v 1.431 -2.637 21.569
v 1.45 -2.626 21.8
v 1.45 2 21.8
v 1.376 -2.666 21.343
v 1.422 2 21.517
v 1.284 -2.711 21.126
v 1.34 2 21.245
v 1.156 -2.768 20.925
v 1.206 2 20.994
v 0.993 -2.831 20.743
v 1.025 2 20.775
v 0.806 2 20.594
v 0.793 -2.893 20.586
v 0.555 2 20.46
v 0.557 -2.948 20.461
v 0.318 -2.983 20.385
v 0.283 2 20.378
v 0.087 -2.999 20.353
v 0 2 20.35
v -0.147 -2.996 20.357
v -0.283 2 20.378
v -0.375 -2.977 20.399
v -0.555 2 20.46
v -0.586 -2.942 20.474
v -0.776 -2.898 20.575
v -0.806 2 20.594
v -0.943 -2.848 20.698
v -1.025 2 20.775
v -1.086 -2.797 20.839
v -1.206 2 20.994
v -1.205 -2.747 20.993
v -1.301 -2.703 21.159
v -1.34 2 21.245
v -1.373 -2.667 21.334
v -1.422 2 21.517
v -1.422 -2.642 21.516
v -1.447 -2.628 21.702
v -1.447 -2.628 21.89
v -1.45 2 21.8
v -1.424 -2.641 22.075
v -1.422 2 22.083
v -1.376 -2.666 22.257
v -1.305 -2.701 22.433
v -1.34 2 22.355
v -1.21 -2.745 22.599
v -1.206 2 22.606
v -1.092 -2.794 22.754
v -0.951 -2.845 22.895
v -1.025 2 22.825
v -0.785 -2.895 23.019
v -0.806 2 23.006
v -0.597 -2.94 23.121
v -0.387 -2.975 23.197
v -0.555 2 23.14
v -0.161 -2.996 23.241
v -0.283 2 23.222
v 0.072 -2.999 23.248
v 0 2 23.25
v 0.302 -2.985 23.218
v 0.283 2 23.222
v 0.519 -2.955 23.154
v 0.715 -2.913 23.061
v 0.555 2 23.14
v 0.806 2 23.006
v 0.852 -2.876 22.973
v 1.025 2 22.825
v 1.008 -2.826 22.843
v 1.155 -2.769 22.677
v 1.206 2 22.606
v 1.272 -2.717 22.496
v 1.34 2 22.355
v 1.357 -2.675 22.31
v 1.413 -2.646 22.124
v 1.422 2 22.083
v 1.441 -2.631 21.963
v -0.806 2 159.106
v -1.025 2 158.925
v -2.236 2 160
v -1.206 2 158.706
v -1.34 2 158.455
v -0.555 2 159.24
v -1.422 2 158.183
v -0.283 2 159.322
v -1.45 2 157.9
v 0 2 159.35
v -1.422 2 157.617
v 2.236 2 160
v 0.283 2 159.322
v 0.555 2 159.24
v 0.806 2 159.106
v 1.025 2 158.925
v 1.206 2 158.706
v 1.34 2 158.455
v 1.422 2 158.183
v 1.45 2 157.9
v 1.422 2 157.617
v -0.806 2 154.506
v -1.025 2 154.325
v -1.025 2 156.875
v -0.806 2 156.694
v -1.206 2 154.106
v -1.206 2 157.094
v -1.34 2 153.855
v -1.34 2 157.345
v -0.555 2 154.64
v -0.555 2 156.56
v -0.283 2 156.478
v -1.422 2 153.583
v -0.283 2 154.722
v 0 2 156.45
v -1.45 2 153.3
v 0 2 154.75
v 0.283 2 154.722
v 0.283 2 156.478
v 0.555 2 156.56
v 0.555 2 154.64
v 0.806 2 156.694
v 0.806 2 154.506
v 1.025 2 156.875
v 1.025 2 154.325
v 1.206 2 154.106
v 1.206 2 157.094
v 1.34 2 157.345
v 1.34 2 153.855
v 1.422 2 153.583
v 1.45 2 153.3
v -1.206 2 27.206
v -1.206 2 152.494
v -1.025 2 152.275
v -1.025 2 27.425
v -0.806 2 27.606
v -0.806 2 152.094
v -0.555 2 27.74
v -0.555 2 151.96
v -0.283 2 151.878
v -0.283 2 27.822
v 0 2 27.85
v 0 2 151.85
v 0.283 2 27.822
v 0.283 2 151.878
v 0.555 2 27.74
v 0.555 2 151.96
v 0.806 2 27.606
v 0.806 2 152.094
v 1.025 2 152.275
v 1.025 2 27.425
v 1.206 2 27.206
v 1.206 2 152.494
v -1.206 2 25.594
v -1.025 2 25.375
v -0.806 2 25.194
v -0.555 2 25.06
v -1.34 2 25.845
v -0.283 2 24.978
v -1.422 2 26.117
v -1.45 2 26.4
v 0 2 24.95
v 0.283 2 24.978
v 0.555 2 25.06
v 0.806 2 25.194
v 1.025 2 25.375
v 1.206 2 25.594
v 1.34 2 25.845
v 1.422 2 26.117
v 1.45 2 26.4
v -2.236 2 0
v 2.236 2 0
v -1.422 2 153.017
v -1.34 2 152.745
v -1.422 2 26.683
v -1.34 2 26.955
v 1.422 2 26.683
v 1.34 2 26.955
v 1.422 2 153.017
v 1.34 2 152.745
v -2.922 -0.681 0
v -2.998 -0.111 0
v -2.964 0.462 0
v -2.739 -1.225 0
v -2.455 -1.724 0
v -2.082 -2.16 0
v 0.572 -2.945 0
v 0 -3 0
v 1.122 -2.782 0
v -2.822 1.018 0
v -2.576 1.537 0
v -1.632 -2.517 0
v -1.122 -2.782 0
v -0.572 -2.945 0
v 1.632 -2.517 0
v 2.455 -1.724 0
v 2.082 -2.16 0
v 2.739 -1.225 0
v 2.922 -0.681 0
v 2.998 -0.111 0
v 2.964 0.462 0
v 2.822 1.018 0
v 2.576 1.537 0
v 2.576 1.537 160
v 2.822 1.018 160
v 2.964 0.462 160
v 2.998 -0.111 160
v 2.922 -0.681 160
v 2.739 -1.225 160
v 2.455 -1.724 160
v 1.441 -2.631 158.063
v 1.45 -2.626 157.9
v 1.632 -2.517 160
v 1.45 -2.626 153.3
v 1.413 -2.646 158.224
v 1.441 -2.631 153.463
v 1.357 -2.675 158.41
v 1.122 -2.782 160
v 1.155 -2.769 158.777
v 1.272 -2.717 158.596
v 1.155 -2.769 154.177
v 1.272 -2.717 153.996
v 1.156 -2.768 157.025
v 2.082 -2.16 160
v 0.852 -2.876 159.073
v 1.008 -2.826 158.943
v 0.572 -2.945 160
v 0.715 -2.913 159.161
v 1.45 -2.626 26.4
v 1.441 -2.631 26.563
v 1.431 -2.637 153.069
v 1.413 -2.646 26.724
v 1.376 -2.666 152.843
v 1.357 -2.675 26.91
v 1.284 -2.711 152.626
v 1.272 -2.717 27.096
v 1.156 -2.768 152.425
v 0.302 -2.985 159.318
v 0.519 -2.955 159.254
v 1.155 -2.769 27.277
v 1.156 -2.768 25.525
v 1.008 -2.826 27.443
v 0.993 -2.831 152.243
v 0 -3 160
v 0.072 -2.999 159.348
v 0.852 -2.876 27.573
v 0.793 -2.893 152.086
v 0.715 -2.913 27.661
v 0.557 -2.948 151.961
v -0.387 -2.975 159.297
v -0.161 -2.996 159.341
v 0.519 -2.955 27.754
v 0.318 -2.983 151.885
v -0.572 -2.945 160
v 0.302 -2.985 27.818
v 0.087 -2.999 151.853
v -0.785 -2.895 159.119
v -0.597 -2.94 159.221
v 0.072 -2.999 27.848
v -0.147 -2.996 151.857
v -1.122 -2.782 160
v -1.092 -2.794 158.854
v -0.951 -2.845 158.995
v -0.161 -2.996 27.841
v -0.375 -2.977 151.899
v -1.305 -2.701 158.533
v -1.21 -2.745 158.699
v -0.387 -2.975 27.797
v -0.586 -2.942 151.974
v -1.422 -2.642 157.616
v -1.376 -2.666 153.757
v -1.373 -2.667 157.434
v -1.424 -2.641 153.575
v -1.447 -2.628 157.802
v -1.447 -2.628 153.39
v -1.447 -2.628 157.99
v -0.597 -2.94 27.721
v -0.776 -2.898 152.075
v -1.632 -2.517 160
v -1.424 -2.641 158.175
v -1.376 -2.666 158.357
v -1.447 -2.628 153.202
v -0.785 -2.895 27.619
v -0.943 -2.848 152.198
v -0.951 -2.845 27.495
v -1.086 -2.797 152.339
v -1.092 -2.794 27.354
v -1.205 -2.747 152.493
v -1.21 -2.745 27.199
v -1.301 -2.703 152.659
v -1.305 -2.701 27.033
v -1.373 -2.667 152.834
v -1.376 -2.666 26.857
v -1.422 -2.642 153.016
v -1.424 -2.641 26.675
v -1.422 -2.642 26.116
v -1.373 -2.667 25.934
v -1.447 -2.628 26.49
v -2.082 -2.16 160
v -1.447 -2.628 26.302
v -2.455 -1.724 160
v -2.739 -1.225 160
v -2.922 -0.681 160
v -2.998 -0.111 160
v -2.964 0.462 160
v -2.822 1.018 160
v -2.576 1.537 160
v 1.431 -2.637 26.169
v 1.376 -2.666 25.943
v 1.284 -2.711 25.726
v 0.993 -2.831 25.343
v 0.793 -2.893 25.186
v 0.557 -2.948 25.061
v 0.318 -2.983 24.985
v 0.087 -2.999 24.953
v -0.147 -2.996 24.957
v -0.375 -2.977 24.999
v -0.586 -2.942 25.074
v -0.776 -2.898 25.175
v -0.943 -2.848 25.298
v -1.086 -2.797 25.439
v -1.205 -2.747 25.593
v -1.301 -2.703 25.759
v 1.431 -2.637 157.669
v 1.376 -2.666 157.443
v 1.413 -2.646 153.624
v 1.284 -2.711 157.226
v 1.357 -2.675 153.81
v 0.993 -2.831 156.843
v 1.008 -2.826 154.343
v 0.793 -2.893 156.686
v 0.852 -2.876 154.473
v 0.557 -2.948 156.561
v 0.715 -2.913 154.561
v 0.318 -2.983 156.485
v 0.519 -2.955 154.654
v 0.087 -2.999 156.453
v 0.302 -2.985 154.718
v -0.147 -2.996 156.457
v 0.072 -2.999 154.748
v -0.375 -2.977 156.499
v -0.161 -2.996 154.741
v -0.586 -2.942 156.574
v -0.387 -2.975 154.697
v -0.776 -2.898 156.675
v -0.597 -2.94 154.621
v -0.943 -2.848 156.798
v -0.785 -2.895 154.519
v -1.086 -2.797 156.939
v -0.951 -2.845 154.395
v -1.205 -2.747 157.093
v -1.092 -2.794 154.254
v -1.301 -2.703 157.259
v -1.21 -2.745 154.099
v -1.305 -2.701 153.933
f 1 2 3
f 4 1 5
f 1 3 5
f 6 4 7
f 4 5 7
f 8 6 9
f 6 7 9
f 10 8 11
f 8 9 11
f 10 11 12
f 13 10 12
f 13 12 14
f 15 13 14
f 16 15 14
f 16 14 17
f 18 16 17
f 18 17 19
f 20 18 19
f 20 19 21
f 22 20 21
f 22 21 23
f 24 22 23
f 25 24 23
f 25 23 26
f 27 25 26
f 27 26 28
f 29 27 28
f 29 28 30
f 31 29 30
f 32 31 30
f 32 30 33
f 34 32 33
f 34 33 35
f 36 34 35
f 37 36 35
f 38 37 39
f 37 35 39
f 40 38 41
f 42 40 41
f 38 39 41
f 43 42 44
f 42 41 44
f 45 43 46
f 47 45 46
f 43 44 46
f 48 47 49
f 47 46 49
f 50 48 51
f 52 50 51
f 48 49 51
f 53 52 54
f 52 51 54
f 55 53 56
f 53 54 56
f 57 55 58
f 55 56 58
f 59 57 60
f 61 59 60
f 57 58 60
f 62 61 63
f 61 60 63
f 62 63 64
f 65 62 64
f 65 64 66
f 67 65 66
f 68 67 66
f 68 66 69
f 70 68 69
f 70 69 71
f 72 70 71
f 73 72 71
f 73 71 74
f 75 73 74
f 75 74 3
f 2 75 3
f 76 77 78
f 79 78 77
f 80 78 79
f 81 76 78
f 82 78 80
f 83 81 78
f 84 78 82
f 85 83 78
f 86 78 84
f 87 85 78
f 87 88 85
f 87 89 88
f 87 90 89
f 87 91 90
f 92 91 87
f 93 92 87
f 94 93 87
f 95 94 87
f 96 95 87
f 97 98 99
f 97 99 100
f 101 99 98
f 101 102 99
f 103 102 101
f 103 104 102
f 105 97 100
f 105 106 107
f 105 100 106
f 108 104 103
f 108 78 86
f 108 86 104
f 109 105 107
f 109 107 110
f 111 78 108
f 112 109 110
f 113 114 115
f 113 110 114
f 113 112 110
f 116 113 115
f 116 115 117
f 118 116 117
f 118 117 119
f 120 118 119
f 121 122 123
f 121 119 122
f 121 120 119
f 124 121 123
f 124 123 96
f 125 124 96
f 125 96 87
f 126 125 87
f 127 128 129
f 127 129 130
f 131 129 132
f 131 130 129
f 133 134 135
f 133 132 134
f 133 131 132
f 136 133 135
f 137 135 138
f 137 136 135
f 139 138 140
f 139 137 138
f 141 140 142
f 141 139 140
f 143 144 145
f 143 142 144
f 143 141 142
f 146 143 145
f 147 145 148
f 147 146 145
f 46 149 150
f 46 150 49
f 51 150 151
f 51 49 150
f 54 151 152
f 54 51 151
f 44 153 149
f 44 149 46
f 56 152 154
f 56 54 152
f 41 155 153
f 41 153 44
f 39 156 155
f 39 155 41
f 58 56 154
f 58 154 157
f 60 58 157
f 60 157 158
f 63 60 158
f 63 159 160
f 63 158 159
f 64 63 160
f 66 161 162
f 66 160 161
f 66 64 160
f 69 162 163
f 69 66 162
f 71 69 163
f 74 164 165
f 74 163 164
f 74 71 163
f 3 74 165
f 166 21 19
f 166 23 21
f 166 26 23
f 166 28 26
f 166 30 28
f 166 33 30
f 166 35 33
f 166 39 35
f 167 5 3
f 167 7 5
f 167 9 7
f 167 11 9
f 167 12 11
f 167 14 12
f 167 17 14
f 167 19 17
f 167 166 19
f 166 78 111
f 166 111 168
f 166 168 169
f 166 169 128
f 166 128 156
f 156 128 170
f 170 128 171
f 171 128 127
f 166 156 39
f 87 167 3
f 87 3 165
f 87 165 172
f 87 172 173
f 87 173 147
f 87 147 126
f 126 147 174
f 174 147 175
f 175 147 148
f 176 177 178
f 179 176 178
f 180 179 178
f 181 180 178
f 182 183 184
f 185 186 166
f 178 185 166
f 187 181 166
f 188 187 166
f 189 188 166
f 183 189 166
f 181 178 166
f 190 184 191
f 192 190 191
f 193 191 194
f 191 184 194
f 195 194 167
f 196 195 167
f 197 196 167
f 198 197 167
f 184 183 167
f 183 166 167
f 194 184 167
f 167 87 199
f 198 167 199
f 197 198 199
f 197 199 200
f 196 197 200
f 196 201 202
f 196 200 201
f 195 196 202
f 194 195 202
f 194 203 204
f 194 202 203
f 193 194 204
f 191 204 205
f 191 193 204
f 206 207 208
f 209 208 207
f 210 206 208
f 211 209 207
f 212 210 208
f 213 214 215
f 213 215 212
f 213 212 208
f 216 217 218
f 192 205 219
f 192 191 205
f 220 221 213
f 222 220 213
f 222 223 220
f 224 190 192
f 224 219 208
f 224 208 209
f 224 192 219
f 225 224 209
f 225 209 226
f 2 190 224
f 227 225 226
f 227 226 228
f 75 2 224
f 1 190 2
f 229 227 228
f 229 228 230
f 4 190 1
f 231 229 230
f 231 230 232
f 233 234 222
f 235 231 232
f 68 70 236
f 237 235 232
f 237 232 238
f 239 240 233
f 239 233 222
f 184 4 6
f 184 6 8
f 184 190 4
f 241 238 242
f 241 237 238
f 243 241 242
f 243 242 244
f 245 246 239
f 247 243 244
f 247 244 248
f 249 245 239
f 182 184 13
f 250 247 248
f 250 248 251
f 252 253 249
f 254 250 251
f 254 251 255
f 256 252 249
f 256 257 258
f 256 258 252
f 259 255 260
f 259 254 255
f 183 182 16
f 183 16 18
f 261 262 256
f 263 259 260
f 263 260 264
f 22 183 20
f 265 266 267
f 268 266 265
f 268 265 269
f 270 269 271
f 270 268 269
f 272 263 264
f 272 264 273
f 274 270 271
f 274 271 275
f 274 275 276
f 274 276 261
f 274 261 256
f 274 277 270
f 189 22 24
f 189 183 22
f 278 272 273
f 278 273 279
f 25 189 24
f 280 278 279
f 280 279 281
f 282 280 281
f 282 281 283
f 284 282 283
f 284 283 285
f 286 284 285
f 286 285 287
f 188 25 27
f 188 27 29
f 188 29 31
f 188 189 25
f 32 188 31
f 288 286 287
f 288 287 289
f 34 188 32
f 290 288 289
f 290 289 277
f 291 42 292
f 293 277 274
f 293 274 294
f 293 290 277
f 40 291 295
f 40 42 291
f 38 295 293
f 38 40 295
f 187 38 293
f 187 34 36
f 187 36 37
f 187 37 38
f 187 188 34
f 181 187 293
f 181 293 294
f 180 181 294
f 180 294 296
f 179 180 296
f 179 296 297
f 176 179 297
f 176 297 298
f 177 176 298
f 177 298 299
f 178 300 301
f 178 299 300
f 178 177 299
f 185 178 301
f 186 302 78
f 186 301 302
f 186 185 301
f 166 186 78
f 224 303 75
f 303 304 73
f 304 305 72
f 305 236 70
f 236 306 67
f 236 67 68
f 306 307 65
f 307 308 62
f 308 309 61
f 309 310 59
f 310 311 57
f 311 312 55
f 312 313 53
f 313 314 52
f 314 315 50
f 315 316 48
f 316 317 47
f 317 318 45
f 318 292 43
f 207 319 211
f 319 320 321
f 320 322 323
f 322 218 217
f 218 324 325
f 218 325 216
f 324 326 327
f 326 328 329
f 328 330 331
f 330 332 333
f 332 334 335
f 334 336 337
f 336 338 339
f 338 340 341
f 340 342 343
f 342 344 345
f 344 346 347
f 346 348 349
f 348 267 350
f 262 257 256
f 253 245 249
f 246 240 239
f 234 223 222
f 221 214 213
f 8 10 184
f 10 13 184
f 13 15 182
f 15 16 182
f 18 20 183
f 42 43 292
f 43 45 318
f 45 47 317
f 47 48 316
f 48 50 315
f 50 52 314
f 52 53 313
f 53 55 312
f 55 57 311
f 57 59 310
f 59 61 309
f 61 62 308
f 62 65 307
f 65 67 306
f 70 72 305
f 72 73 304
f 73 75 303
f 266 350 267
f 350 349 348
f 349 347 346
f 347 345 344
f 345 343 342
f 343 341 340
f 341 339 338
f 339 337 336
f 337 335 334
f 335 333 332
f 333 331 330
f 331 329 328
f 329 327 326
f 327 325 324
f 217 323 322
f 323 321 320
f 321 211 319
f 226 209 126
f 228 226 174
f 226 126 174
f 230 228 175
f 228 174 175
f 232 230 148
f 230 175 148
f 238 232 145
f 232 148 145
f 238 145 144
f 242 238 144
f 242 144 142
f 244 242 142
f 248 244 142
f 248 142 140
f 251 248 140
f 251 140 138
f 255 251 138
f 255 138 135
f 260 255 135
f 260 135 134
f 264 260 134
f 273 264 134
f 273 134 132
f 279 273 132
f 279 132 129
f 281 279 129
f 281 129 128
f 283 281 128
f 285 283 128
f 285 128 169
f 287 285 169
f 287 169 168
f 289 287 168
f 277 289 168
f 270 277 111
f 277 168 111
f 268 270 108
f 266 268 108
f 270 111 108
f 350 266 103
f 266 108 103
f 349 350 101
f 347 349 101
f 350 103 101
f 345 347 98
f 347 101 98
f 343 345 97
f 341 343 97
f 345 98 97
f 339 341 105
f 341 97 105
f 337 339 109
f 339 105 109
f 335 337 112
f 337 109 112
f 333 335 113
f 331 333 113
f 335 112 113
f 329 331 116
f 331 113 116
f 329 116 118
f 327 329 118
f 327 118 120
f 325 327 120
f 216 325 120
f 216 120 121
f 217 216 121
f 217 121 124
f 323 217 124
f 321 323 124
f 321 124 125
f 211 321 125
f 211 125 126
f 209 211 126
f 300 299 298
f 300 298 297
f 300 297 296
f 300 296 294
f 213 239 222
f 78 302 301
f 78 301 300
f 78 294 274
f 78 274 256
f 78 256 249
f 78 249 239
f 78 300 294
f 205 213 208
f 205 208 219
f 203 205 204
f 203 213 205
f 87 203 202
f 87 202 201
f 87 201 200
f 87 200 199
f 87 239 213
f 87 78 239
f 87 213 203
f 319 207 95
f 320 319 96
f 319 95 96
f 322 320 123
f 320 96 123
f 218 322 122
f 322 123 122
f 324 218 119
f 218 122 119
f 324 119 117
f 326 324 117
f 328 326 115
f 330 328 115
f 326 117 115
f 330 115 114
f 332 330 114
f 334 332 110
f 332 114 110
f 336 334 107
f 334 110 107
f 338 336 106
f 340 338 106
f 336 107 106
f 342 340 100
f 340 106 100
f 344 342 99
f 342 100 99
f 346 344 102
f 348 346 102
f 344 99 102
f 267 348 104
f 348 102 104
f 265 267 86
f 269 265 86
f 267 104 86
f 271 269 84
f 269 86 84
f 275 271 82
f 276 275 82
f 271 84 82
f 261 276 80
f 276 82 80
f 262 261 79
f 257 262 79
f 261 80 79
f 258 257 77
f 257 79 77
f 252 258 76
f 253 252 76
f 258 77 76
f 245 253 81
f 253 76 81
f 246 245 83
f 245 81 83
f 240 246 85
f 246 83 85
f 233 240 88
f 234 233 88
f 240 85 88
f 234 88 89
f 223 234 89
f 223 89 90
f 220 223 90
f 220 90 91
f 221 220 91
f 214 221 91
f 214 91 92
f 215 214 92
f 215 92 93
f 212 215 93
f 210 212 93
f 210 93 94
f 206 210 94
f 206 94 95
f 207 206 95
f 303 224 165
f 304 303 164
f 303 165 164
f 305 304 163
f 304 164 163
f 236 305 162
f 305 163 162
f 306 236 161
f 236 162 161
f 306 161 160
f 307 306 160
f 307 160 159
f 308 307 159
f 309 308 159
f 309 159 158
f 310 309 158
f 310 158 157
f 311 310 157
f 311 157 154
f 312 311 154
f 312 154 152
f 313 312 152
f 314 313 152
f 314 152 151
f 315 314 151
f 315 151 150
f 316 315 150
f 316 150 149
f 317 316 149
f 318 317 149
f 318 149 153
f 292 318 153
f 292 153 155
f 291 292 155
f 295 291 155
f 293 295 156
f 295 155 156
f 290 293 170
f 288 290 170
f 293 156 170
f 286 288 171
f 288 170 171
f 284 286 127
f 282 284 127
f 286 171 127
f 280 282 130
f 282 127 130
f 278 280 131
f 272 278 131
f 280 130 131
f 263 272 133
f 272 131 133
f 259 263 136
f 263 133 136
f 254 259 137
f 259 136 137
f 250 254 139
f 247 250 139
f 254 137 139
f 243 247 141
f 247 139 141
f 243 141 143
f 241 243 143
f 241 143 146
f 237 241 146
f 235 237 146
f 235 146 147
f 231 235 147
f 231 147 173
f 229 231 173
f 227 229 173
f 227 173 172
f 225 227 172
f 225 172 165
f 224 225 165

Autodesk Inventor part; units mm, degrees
ref_plane "YZ Plane" through (0, 0, 0) normal (1, 0, 0) x (0, 1, 0)
ref_plane "XZ Plane" through (0, 0, 0) normal (0, 1, 0) x (-1, 0, 0)
ref_plane "XY Plane" through (0, 0, 0) normal (0, 0, 1) x (1, 0, 0)
sketch "Sketch1" plane through (0, 0, 0) normal (0, 0, 1) x (1, 0, 0)
  circle A0 centre (0, 0) radius 3 construction
  line L0 (-2.2361, 2) -> (2.2361, 2)
  arc A1 (-2.2361, 2) -> (2.2361, 2) centre (0, 0) ccw
  dimension "d0" = 6
  dimension "d1" = 2
extrude "Extrusion1" add sketch "Sketch1" along normal blind 160
sketch "Sketch2" plane through (-2.2361, 2, 0) normal (0, 1, 0) x (1, 0, 0)
  circle A0 centre (2.2361, -157.9) radius 1.45
  line L0 (4.4721, -160) -> (0, -160) projected
  circle A1 centre (2.2361, -21.8) radius 1.45
  line L1 (0, 0) -> (4.4721, 0) projected
  circle A2 centre (2.2361, -26.4) radius 1.45
  circle A3 centre (2.2361, -153.3) radius 1.45
  point P0 (2.2361, 0)
  point P1 (2.2361, -160)
  point P2 (2.2361, 0)
  dimension "d4" = 2.9
  dimension "d5" = 2.1
  dimension "d8" = 2.9
  dimension "d9" = 21.8
  dimension "d10" = 2.9
  dimension "d11" = 4.6
  dimension "d12" = 2.9
  dimension "d13" = 4.6
extrude "Extrusion2" cut sketch "Sketch2" against normal through all
thread "Thread1" size "M3x0.5" class "6H" standard "ANSI Metric M Profile" full length
thread "Thread2" size "M3x0.5" class "6H" standard "ANSI Metric M Profile" full length
thread "Thread3" size "M3x0.5" class "6H" standard "ANSI Metric M Profile" full length
thread "Thread4" size "M3x0.5" class "6H" standard "ANSI Metric M Profile" full length
properties part number "6mm x 160mm D Shaft" material "Stainless Steel"
